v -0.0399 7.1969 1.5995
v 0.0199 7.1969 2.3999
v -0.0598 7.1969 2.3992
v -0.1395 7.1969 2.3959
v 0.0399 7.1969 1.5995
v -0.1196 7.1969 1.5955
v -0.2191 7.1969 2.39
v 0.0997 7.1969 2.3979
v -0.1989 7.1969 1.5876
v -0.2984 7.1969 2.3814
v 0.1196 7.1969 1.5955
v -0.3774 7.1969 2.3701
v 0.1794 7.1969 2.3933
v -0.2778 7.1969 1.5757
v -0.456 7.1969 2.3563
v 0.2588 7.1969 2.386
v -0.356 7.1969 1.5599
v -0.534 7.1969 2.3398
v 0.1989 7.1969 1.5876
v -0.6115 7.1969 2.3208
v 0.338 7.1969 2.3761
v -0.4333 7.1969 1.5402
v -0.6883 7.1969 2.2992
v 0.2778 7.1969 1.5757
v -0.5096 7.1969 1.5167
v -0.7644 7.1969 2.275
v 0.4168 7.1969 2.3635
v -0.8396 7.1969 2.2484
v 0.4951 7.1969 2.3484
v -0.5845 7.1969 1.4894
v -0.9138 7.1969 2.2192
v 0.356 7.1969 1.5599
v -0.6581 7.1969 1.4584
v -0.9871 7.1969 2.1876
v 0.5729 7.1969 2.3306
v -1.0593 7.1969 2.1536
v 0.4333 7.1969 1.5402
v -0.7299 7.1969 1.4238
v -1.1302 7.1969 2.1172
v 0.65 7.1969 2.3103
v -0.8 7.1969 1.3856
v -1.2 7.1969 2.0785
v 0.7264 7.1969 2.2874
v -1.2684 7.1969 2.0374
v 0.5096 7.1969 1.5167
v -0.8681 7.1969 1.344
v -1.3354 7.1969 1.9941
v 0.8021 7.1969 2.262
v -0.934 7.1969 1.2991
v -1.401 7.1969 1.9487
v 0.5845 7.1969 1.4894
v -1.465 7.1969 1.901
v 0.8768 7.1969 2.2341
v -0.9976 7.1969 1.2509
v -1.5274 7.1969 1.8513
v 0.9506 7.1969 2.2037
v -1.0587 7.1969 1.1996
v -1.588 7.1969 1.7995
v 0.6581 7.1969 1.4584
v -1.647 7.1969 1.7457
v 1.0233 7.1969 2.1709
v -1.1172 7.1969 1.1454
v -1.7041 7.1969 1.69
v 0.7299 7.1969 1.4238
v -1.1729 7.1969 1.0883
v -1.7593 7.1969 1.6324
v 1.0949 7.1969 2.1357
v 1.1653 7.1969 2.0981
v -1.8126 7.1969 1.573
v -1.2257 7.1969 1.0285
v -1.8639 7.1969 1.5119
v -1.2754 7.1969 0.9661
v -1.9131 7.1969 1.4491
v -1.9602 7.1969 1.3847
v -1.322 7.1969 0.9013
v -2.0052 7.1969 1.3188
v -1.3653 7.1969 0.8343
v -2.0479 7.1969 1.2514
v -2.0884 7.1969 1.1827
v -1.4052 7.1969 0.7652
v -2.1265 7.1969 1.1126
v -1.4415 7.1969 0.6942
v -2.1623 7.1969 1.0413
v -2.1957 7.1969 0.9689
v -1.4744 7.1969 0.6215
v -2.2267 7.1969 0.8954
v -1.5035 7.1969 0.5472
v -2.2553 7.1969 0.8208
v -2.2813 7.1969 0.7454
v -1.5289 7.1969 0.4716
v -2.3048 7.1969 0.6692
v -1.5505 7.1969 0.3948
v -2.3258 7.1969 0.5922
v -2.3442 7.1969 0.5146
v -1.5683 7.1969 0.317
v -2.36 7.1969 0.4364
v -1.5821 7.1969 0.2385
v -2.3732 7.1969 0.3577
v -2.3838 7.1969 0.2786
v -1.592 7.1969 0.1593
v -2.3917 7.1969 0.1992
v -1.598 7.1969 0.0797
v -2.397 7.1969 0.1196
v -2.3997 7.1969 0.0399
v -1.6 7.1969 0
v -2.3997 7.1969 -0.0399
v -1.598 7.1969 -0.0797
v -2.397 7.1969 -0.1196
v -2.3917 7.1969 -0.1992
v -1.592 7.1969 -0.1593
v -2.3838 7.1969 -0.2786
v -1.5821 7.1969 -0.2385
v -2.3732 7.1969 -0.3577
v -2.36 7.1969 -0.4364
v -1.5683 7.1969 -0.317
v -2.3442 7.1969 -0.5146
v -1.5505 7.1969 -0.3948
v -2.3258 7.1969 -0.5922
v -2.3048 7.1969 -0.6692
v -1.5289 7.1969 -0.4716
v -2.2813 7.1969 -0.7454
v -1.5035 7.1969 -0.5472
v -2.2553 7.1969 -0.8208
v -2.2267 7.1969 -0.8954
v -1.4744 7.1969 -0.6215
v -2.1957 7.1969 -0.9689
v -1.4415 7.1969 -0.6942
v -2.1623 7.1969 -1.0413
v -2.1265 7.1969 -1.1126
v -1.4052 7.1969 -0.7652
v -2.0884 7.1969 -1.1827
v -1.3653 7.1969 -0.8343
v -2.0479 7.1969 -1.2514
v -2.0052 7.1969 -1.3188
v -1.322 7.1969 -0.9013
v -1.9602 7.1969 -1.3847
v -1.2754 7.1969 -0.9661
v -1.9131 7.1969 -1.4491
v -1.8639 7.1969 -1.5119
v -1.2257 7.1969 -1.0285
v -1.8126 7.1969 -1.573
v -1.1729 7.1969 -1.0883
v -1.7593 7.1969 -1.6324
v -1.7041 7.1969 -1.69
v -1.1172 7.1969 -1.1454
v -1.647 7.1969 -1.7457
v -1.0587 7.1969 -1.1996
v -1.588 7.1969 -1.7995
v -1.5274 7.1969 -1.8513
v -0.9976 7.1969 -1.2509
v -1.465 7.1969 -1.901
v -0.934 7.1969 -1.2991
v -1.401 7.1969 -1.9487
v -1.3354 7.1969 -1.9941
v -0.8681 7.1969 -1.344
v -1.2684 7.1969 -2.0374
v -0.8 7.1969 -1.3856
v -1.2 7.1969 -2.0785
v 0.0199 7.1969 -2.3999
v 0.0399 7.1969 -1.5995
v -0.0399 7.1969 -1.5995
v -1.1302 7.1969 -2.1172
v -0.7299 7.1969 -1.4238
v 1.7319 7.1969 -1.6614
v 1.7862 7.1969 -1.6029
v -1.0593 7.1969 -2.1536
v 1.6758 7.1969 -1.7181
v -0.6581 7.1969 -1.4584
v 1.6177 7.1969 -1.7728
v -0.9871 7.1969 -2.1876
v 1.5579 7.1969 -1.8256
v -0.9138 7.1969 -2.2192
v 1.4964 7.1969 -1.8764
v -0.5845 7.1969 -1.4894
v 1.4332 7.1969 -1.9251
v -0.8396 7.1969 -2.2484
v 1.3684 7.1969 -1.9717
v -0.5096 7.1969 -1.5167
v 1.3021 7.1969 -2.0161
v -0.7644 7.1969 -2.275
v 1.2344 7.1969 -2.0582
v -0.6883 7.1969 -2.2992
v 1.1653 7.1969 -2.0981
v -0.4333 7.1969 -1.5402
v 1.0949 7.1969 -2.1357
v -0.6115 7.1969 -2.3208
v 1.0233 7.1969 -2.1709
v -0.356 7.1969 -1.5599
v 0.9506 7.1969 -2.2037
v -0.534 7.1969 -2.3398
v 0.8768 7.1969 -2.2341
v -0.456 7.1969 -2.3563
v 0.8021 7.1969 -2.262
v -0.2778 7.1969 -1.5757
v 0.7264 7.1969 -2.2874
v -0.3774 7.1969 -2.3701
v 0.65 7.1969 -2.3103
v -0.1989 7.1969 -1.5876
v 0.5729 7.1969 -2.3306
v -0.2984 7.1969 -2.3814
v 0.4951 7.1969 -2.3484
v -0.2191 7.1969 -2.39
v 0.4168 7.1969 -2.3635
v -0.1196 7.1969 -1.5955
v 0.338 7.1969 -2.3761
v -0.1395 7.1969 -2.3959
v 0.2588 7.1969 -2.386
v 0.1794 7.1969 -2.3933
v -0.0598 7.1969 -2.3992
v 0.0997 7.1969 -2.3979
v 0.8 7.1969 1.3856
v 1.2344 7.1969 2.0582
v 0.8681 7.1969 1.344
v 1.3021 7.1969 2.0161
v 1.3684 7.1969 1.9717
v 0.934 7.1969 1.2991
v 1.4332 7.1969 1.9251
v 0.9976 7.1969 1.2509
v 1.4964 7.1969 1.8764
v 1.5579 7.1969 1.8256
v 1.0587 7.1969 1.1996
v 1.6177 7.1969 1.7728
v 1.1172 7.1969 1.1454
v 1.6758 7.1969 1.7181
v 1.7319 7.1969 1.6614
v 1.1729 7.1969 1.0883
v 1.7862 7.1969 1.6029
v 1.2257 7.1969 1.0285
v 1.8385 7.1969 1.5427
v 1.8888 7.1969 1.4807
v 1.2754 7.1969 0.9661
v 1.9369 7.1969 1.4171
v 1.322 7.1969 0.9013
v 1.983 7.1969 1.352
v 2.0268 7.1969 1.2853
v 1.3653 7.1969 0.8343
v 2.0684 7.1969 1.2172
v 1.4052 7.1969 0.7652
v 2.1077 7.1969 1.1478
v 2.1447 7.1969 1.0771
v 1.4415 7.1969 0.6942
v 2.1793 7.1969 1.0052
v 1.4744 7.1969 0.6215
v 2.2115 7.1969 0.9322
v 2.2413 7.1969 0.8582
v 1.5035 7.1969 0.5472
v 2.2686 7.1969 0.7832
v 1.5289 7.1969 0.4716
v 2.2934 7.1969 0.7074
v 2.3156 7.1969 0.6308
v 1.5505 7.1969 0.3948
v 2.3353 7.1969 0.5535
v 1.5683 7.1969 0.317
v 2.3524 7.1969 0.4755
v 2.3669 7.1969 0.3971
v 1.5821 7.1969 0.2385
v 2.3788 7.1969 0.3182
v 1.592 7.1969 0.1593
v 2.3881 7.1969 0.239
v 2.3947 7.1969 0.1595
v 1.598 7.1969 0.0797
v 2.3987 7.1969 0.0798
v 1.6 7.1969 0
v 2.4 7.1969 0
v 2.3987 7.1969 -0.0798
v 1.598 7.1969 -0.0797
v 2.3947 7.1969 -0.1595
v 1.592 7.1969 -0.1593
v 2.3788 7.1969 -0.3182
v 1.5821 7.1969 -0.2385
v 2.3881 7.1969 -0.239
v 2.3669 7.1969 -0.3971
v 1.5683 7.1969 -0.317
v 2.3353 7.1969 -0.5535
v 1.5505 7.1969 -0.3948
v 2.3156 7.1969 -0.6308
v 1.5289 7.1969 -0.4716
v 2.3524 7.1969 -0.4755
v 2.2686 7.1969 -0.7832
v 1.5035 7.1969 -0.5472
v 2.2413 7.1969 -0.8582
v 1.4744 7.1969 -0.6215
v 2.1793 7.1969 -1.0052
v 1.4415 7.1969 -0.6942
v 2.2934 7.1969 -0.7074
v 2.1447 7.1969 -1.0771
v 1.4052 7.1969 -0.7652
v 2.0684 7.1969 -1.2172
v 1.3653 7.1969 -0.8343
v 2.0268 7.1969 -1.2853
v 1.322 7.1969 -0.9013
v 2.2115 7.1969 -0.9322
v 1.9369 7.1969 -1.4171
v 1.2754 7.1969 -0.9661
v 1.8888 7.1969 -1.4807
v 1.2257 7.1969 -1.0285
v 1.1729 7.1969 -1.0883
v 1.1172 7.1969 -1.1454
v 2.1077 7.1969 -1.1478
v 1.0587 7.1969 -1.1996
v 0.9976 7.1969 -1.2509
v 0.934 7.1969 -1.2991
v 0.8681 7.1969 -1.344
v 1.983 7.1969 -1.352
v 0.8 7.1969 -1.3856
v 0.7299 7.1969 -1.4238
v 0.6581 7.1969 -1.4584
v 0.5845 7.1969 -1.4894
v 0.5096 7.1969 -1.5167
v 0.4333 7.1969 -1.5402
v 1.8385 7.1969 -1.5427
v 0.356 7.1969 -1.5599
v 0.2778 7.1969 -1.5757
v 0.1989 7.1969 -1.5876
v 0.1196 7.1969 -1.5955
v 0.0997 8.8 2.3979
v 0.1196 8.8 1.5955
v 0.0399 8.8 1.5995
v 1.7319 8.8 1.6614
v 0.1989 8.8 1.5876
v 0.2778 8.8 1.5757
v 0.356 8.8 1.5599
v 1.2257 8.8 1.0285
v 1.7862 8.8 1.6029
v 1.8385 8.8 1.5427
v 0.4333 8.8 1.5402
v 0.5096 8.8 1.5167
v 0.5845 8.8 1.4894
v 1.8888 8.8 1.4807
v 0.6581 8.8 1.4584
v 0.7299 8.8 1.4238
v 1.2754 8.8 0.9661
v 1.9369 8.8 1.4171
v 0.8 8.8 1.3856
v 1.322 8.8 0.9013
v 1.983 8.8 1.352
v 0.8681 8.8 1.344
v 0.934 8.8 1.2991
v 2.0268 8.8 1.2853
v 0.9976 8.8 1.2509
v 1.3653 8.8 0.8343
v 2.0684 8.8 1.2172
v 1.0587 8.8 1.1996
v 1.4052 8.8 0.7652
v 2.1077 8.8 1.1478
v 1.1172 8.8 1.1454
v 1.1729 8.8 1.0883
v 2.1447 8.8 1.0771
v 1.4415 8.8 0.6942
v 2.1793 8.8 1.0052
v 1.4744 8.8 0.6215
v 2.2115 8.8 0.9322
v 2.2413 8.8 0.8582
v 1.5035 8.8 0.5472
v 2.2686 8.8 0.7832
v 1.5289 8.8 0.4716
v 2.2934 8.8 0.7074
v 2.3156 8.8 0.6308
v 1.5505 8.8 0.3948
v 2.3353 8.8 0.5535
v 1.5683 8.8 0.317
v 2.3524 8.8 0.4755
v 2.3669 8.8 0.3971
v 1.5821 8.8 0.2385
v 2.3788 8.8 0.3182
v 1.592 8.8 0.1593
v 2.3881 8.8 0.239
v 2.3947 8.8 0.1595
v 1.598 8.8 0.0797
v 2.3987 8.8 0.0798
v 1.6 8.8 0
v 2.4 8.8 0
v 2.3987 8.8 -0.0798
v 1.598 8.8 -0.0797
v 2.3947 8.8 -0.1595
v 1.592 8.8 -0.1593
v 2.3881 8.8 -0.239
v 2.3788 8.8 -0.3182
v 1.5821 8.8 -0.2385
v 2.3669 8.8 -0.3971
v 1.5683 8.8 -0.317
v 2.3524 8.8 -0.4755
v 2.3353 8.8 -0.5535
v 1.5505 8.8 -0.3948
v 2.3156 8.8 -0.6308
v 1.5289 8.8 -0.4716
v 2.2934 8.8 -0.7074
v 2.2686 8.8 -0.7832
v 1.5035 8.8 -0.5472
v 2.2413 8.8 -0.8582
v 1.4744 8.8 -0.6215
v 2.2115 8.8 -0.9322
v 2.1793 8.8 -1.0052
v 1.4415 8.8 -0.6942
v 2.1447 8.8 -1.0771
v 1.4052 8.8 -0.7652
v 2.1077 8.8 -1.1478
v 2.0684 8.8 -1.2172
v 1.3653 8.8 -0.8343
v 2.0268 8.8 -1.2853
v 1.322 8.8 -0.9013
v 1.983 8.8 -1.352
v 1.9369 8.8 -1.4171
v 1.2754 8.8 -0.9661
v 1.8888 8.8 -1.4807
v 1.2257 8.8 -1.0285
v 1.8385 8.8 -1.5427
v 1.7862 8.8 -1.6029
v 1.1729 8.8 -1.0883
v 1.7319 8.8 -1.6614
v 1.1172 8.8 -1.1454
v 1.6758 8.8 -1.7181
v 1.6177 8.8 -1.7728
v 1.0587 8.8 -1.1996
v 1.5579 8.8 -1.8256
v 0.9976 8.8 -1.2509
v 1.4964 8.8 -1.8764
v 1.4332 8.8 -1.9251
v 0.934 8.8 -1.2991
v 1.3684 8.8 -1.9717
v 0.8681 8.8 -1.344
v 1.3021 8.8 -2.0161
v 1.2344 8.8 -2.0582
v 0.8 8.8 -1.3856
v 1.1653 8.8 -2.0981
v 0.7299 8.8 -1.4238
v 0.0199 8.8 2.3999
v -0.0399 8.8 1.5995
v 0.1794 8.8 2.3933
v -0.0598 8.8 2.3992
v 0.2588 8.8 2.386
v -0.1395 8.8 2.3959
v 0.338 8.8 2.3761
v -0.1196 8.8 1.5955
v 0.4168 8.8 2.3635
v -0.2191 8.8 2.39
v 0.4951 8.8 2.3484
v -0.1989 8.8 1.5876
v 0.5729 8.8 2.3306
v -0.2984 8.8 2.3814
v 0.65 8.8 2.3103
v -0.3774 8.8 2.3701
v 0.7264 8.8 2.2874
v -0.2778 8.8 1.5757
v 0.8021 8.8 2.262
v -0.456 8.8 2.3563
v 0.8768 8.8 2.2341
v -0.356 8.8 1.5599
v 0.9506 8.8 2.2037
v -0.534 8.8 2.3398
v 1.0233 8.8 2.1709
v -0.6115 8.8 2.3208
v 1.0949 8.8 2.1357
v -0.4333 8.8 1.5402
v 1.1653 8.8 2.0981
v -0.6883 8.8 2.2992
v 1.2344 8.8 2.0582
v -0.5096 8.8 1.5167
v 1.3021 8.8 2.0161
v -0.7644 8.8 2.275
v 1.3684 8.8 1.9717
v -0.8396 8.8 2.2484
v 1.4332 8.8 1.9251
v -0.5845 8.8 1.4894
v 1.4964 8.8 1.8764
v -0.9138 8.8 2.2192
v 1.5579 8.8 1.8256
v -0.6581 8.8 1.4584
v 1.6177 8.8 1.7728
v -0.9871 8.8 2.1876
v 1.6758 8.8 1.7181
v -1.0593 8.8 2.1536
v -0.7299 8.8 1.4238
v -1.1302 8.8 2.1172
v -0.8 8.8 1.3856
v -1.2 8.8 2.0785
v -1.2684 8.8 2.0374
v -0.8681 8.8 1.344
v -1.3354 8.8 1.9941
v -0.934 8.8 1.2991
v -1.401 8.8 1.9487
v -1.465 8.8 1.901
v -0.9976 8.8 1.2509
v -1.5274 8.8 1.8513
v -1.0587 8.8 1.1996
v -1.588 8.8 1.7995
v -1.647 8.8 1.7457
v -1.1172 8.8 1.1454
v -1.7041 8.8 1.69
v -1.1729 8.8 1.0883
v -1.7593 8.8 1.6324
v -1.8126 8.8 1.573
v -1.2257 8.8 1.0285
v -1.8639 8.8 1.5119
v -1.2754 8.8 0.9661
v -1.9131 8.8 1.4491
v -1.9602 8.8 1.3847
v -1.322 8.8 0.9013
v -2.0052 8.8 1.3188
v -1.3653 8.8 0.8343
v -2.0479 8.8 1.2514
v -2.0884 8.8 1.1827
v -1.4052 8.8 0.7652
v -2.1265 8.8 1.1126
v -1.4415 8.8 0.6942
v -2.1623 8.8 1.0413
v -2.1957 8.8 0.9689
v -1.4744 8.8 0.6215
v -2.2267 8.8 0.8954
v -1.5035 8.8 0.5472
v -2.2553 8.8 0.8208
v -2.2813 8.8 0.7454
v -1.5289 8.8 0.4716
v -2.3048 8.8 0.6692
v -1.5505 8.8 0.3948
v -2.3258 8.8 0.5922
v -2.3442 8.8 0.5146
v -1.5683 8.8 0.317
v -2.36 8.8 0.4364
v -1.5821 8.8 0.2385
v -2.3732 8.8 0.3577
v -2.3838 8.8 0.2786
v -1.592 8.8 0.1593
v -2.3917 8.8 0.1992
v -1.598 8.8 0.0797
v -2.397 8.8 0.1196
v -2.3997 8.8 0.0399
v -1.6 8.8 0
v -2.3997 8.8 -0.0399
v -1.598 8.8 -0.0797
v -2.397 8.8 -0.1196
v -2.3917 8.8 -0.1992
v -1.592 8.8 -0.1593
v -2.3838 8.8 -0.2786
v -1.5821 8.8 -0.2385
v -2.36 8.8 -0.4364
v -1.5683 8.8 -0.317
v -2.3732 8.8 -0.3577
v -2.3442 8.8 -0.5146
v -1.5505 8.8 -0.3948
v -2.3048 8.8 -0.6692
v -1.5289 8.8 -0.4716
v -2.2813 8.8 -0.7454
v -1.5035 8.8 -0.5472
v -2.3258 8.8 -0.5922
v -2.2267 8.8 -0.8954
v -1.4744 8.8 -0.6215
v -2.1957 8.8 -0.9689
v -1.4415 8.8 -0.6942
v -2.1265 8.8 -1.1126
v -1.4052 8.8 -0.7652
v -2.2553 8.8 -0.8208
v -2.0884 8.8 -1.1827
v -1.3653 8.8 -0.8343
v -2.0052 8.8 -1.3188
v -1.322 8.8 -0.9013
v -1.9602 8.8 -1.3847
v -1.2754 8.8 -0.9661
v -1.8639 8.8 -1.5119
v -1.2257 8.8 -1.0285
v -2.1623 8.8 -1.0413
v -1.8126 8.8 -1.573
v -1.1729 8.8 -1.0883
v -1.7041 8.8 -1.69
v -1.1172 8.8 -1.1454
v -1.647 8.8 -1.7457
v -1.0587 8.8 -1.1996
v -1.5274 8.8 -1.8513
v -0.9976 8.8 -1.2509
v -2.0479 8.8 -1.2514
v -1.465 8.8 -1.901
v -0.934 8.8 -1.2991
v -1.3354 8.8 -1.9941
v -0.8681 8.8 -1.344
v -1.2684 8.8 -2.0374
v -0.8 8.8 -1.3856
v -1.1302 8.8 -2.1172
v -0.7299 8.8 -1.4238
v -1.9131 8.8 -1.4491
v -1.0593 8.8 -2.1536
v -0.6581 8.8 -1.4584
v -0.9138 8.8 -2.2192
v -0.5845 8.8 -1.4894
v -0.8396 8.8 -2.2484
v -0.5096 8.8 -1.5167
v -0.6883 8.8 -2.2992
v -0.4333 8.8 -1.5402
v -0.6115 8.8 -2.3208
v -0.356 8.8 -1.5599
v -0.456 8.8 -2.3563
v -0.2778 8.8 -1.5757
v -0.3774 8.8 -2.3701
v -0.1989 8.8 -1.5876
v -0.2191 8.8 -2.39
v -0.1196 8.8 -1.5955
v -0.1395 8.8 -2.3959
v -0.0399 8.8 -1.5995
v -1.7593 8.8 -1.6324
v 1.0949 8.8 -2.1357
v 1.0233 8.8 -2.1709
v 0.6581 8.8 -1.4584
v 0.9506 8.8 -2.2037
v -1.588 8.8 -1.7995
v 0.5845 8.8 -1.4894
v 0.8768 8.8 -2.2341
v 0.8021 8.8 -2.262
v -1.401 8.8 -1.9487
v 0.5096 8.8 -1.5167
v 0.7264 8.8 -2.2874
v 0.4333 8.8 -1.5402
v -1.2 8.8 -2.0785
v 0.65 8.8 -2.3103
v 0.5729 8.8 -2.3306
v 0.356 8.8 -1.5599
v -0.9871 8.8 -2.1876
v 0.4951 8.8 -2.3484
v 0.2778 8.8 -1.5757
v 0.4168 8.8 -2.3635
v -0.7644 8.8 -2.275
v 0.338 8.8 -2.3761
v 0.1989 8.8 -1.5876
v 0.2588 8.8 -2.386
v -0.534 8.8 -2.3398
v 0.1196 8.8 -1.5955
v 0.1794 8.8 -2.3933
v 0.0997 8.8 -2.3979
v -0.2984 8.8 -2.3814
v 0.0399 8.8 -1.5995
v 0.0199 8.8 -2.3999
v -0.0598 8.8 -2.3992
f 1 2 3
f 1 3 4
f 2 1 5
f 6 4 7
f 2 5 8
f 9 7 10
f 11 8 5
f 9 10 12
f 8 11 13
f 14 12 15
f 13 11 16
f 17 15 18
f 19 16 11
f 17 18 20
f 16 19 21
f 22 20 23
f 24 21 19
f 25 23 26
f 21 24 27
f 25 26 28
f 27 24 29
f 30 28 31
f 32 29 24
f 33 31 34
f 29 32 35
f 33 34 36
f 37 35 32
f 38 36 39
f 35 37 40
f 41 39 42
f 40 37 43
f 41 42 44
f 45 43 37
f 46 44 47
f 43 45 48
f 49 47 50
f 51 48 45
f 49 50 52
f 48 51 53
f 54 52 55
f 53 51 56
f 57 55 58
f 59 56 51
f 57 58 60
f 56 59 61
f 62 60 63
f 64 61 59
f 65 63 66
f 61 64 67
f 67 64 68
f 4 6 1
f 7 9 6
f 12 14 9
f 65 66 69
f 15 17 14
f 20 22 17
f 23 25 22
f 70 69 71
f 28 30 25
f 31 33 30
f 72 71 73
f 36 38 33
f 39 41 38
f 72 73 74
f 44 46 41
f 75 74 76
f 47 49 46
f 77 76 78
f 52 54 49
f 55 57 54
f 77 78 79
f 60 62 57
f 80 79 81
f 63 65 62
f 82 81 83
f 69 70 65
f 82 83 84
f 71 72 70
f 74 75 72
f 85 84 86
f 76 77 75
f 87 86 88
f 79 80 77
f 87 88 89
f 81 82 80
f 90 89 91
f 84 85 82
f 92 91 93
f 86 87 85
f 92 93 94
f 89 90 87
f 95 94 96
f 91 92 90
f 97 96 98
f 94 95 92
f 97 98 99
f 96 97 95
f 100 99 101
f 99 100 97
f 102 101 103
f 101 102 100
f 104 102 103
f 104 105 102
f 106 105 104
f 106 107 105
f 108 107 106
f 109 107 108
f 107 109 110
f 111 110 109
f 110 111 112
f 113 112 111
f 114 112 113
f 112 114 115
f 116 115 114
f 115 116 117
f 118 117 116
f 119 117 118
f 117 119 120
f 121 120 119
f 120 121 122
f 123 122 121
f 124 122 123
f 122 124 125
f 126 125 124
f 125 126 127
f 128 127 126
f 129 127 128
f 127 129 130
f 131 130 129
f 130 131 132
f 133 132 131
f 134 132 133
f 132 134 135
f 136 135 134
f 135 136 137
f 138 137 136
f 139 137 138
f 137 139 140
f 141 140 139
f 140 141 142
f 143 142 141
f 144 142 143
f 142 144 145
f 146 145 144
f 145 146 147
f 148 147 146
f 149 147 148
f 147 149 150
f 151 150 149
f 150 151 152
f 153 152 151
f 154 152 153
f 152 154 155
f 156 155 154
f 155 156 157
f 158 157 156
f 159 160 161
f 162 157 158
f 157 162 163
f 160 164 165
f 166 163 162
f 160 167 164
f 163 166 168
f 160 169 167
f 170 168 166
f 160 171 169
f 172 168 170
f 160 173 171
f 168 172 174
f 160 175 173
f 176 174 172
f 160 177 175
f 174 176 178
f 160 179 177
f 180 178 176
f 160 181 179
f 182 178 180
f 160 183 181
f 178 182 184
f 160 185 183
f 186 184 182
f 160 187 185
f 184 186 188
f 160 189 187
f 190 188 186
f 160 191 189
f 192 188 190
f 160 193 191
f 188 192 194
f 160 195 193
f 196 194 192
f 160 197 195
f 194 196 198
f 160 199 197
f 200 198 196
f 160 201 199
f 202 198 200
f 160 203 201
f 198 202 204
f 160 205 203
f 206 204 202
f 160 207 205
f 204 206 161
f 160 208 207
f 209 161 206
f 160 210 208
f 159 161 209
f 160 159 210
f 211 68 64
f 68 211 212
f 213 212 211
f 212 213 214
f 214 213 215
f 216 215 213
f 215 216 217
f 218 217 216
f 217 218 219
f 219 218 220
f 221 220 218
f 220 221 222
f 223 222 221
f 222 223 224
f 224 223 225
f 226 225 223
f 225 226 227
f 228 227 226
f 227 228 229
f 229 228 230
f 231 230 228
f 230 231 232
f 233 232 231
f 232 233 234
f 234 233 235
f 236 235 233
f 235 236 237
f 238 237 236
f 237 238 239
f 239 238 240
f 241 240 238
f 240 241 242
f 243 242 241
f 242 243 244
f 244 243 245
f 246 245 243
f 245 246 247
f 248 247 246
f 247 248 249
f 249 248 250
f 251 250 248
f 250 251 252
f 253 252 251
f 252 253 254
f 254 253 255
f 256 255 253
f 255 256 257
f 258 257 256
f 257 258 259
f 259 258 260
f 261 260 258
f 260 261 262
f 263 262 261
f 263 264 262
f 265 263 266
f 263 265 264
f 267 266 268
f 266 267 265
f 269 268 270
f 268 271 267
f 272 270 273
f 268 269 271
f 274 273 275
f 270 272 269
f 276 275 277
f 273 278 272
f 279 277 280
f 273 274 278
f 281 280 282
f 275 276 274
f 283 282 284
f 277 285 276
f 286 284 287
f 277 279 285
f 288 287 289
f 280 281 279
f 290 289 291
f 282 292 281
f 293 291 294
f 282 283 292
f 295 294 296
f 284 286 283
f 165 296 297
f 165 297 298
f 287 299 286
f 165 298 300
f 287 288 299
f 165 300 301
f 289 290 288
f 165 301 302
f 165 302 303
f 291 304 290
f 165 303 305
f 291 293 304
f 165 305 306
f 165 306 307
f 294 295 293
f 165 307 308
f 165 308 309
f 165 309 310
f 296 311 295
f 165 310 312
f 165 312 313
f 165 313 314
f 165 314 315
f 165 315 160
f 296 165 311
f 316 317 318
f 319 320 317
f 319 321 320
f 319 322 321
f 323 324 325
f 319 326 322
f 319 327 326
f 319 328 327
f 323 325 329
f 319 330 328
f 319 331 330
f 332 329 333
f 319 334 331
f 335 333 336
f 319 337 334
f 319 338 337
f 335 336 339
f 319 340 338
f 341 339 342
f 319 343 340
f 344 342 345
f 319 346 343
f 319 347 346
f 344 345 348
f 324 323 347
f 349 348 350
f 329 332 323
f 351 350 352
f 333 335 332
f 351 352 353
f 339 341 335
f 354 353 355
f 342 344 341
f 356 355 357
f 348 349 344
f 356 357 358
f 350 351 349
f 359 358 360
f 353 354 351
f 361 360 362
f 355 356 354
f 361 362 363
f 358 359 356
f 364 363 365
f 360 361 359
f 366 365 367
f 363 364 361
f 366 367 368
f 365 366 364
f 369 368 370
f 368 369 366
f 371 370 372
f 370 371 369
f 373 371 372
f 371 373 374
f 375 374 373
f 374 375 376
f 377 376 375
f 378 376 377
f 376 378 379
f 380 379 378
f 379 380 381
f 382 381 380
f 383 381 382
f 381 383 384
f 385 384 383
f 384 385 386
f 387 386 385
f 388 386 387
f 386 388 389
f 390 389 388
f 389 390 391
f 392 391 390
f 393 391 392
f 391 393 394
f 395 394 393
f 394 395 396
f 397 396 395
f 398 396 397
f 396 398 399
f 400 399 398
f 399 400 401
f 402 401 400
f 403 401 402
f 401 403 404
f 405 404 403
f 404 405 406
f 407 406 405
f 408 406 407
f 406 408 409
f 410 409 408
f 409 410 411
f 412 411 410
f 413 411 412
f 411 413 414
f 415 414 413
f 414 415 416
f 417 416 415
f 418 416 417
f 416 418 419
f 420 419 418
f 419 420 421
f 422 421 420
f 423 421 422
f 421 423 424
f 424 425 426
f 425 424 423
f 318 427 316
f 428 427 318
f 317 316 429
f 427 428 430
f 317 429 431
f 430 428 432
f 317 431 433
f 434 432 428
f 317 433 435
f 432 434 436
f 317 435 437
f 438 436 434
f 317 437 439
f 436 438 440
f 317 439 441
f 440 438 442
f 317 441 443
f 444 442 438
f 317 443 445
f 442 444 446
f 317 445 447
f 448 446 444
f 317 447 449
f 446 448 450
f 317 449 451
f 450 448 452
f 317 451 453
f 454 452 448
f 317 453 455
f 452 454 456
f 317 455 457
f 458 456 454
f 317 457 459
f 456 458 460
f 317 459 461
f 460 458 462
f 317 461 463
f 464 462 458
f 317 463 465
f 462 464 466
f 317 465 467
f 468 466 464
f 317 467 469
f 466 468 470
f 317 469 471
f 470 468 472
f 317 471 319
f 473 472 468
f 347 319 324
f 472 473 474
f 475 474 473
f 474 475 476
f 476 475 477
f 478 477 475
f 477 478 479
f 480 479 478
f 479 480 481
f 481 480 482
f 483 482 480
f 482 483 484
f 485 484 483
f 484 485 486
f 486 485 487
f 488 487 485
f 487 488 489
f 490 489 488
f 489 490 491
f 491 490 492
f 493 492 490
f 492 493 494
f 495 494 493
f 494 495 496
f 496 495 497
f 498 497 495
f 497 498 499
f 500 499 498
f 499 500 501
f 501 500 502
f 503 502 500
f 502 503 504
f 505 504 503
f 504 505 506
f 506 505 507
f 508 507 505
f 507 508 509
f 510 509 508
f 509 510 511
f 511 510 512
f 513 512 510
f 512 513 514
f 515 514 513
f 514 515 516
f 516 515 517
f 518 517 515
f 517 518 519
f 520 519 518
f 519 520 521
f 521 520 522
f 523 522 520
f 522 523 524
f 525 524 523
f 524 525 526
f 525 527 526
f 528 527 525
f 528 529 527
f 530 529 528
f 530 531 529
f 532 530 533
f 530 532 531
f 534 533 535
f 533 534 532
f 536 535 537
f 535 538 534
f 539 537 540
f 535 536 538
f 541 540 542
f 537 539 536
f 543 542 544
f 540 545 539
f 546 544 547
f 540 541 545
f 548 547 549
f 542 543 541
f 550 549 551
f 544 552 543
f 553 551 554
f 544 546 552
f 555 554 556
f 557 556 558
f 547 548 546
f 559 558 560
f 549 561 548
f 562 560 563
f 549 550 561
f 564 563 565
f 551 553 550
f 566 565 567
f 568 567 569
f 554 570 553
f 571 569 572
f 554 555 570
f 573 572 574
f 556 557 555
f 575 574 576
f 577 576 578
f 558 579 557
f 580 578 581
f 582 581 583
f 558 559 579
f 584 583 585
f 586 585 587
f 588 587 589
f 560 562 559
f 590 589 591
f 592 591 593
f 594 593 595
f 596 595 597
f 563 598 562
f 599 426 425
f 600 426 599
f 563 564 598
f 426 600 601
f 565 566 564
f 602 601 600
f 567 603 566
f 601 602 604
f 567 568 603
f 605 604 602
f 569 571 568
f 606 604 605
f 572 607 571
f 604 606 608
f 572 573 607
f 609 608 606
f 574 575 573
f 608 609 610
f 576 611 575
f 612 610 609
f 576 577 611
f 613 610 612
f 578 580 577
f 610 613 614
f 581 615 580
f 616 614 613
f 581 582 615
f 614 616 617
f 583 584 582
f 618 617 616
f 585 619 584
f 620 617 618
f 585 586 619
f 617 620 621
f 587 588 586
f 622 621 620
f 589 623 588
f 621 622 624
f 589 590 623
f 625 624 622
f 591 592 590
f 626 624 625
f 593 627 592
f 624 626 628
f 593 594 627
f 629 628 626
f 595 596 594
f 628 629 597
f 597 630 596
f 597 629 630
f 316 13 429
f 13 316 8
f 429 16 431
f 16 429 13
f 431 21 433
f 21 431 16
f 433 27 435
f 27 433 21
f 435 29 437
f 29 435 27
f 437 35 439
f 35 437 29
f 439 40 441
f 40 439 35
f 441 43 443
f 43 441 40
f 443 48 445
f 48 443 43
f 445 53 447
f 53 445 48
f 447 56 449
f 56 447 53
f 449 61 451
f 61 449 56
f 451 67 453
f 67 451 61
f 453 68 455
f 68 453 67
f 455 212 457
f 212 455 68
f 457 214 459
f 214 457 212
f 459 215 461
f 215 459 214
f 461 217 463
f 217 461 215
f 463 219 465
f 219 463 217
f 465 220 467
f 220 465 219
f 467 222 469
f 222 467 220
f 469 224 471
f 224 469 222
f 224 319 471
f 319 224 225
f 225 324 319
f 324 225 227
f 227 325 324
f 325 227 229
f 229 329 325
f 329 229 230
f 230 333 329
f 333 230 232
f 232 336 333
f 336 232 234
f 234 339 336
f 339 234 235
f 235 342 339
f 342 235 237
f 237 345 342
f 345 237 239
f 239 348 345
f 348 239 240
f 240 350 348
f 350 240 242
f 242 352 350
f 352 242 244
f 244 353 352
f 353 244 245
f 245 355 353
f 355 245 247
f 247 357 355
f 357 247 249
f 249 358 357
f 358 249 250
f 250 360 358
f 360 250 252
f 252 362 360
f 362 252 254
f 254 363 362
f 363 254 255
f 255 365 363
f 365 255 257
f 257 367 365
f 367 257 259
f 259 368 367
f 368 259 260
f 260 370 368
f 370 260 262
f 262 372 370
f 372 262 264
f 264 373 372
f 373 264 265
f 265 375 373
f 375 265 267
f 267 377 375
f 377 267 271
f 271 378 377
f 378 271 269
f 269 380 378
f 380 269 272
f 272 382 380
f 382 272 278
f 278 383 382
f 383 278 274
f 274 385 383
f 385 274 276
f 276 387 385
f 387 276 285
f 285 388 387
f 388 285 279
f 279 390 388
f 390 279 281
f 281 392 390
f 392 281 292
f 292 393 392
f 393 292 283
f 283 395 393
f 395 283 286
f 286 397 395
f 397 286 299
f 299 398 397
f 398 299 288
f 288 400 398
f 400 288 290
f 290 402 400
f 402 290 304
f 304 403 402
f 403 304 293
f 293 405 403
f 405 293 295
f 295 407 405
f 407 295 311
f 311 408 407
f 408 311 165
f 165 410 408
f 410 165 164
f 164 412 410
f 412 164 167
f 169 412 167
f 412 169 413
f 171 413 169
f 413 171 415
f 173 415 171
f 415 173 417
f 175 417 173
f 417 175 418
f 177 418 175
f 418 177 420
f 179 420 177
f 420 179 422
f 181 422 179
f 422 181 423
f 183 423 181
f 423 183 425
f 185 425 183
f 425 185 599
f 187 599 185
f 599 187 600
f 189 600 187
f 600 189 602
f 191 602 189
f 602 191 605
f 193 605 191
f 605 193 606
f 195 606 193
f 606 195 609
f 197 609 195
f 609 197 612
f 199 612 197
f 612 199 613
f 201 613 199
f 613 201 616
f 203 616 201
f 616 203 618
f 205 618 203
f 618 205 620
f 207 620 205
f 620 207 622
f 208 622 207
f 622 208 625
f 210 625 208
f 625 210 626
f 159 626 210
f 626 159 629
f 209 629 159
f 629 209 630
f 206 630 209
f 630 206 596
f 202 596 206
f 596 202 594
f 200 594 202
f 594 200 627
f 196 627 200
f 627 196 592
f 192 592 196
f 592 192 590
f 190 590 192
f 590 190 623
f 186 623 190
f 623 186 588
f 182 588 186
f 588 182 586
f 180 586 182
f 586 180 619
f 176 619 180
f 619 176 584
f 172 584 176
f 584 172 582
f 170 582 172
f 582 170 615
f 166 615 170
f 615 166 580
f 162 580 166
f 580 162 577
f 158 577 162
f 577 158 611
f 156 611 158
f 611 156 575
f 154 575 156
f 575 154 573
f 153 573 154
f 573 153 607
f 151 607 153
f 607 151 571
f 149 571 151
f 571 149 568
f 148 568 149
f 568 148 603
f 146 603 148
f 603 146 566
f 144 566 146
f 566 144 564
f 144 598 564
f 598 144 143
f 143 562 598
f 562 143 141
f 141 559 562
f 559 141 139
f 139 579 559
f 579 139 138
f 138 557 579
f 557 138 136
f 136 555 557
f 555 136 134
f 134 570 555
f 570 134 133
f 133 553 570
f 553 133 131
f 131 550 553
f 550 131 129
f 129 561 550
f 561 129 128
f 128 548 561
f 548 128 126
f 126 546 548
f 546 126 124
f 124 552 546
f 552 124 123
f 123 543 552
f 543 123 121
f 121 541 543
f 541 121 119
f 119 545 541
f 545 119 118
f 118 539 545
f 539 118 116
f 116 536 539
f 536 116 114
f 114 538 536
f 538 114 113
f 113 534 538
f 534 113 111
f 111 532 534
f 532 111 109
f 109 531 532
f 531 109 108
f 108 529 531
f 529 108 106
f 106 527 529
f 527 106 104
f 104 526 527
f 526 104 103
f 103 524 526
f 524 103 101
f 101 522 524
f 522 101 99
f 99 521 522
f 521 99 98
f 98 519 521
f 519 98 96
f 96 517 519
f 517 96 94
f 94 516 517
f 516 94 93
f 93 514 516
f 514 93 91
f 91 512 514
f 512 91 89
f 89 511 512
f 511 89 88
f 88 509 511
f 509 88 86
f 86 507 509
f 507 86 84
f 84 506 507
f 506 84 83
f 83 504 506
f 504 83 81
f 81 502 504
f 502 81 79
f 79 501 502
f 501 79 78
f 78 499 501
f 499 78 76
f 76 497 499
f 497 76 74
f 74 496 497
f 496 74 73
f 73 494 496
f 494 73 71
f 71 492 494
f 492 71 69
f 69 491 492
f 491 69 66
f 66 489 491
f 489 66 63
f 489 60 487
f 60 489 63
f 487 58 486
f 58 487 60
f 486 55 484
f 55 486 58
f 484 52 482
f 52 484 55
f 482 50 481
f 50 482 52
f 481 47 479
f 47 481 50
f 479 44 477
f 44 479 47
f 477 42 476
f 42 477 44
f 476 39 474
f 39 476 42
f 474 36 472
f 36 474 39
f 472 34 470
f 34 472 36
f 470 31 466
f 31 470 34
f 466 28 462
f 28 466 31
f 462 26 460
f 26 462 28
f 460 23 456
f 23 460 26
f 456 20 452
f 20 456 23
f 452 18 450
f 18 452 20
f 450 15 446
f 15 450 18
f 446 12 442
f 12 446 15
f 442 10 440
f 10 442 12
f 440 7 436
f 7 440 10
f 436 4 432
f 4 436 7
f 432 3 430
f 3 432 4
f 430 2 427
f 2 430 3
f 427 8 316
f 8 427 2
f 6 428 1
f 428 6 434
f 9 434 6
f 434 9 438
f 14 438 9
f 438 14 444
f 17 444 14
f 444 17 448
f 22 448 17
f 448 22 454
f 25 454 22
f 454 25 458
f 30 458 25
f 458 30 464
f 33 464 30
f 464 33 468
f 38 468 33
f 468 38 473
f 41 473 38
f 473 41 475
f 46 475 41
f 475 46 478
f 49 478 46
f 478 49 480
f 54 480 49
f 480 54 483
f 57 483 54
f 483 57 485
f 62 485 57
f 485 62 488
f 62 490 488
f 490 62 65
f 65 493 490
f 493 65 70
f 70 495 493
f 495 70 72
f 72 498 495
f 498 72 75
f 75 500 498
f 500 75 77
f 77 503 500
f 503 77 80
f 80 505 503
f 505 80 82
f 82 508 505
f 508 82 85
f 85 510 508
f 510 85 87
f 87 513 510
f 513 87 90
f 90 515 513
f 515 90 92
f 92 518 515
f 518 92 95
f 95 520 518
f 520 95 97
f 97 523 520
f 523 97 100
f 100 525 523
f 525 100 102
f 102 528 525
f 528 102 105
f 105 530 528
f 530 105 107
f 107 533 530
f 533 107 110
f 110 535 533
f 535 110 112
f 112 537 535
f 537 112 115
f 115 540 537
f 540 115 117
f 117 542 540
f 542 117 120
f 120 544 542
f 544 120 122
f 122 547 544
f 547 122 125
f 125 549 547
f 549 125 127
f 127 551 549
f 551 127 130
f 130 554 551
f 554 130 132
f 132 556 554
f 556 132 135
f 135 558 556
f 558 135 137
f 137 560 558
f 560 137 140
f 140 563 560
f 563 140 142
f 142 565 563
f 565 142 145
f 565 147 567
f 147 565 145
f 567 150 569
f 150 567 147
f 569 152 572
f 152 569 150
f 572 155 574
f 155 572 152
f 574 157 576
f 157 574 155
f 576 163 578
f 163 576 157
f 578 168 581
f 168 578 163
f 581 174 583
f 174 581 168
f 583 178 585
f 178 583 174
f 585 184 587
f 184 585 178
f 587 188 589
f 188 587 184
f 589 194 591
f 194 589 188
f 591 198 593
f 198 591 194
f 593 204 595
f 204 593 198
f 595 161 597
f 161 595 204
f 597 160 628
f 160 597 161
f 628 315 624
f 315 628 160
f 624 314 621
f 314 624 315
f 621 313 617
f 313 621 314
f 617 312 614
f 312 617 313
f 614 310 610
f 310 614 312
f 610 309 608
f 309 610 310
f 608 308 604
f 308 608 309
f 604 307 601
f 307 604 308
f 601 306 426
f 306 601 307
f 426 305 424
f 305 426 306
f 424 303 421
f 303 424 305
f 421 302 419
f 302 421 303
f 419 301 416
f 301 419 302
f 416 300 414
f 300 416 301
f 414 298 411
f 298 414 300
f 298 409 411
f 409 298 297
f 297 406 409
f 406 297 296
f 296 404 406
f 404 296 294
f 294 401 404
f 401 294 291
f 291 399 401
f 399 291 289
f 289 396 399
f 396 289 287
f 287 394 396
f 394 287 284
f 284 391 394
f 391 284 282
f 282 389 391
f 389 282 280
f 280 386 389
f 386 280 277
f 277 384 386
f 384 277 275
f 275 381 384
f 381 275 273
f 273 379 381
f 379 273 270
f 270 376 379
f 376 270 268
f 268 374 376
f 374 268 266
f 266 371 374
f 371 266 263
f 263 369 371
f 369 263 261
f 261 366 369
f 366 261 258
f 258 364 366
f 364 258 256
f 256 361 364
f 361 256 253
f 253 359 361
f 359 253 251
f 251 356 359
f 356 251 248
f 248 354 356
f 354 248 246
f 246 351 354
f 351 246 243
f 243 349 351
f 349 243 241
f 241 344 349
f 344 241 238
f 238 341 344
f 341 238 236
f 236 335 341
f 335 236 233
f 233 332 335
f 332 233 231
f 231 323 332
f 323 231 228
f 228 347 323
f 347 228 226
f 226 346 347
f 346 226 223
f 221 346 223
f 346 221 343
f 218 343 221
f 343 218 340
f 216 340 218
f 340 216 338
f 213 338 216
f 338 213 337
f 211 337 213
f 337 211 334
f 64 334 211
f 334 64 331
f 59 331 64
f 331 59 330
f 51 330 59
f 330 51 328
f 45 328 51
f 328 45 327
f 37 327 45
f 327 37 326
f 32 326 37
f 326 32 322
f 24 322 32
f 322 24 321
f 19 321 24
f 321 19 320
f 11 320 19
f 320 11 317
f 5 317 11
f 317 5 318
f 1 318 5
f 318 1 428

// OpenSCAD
use <../lib.scad>
use <../p/4-4con2.scad>
use <../p/4-4con8.scad>
use <../p/4-4cyli.scad>
use <../p/4-4disc.scad>
use <../p/4-4edge.scad>
use <../p/4-4ring3.scad>
use <../p/4-4ring4.scad>
use <../p/stud2.scad>
$fa=1; $fs=0.2;
function ldraw_lib__4349(realsolid=false) = [
// 0 Minifig Loudhailer
// 0 Name: 4349.dat
// 0 Author: James Jessiman
// 0 !LDRAW_ORG Part UPDATE 2010-01
// 0 !LICENSE Licensed under CC BY 2.0 and CC BY 4.0 : see CAreadme.txt
// 
// 0 BFC CERTIFY CCW
  [0,"BFC","CERTIFY"],
  [0,"BFC","CCW"],
// 
// 0 !CATEGORY Minifig Accessory
// 0 !KEYWORDS Blaster, bullhorn, cone, megaphone, space gun, town
// 
// 0 !HISTORY 1998-06-20 [PTadmin] Official Update 1998-06
// 0 !HISTORY 2001-10-01 [pneaster] used existing primitives to enhance appearance
// 0 !HISTORY 2001-11-30 [PTadmin] Official Update 2001-02
// 0 !HISTORY 2007-07-04 [PTadmin] Header formatted for Contributor Agreement
// 0 !HISTORY 2008-07-01 [PTadmin] Official Update 2008-01
// 0 !HISTORY 2008-07-07 [jriley] BFC compliancy (2003-06-08)
// 0 !HISTORY 2008-07-08 [mikeheide] added edgelines (2007-11-02)
// 0 !HISTORY 2008-07-09 [mikeheide] Corrected title (2008-03-01)
// 0 !HISTORY 2010-04-05 [PTadmin] Official Update 2010-01
// 
// 
// 1 16 0 0 18 0 0 -1 1 0 0 0 -1 0 stud2.dat
  [1,16,0,0,18,0,0,-1,1,0,0,0,-1,0, ldraw_lib__stud2(realsolid)],
// 1 16 0 20 0 4 0 0 0 1 0 0 0 4 4-4edge.dat
  [1,16,0,20,0,4,0,0,0,1,0,0,0,4, ldraw_lib__4_4edge(realsolid)],
// 1 16 0 0 18 7.104 0 0 0 0 7.104 0 1 0 4-4edge.dat
  [1,16,0,0,18,7.104,0,0,0,0,7.104,0,1,0, ldraw_lib__4_4edge(realsolid)],
// 1 16 0 0 -4 6.666 0 0 0 0 6.666 0 1 0 4-4edge.dat
  [1,16,0,0,-4,6.666,0,0,0,0,6.666,0,1,0, ldraw_lib__4_4edge(realsolid)],
// 1 16 0 0 -4 4 0 0 0 0 4 0 1 0 4-4edge.dat
  [1,16,0,0,-4,4,0,0,0,0,4,0,1,0, ldraw_lib__4_4edge(realsolid)],
// 1 16 0 0 -22 6 0 0 0 0 6 0 1 0 4-4edge.dat
  [1,16,0,0,-22,6,0,0,0,0,6,0,1,0, ldraw_lib__4_4edge(realsolid)],
// 1 16 0 0 -22 10 0 0 0 0 10 0 1 0 4-4edge.dat
  [1,16,0,0,-22,10,0,0,0,0,10,0,1,0, ldraw_lib__4_4edge(realsolid)],
// 1 16 0 20 0 4 0 0 0 -1 0 0 0 4 4-4disc.dat
  [1,16,0,20,0,4,0,0,0,-1,0,0,0,4, ldraw_lib__4_4disc(realsolid)],
// 1 16 0 0 18 7.104 0 0 0 0 7.104 0 -1 0 4-4disc.dat
  [1,16,0,0,18,7.104,0,0,0,0,7.104,0,-1,0, ldraw_lib__4_4disc(realsolid)],
// 1 16 0 0 -4 1.4208 0 0 0 0 1.4208 0 1 0 4-4ring4.dat
  [1,16,0,0,-4,1.4208,0,0,0,0,1.4208,0,1,0, ldraw_lib__4_4ring4(realsolid)],
// 1 16 0 5.9533 0 4 0 0 0 14.0467 0 0 0 4 4-4cyli.dat
  [1,16,0,5.9533,0,4,0,0,0,14.0467,0,0,0,4, ldraw_lib__4_4cyli(realsolid)],
// 1 16 0 0 -4 7.104 0 0 0 0 7.104 0 1 0 4-4edge.dat
  [1,16,0,0,-4,7.104,0,0,0,0,7.104,0,1,0, ldraw_lib__4_4edge(realsolid)],
// 1 16 0 0 -3.25 0.888 0 0 0 0 0.888 0 -0.75 0 4-4con8.dat
  [1,16,0,0,-3.25,0.888,0,0,0,0,0.888,0,-0.75,0, ldraw_lib__4_4con8(realsolid)],
// 1 16 0 0 -3.25 8 0 0 0 0 8 0 1.25 0 4-4cyli.dat
  [1,16,0,0,-3.25,8,0,0,0,0,8,0,1.25,0, ldraw_lib__4_4cyli(realsolid)],
// 1 16 0 0 -2 0.888 0 0 0 0 0.888 0 0.75 0 4-4con8.dat
  [1,16,0,0,-2,0.888,0,0,0,0,0.888,0,0.75,0, ldraw_lib__4_4con8(realsolid)],
// 1 16 0 0 -1.25 7.104 0 0 0 0 7.104 0 1 0 4-4edge.dat
  [1,16,0,0,-1.25,7.104,0,0,0,0,7.104,0,1,0, ldraw_lib__4_4edge(realsolid)],
// 1 16 0 0 -0.5 0.888 0 0 0 0 0.888 0 -0.75 0 4-4con8.dat
  [1,16,0,0,-0.5,0.888,0,0,0,0,0.888,0,-0.75,0, ldraw_lib__4_4con8(realsolid)],
// 1 16 0 0 -0.5 8 0 0 0 0 8 0 1.25 0 4-4cyli.dat
  [1,16,0,0,-0.5,8,0,0,0,0,8,0,1.25,0, ldraw_lib__4_4cyli(realsolid)],
// 1 16 0 0 0.75 0.888 0 0 0 0 0.888 0 0.75 0 4-4con8.dat
  [1,16,0,0,0.75,0.888,0,0,0,0,0.888,0,0.75,0, ldraw_lib__4_4con8(realsolid)],
// 1 16 0 0 1.5 7.104 0 0 0 0 7.104 0 1 0 4-4edge.dat
  [1,16,0,0,1.5,7.104,0,0,0,0,7.104,0,1,0, ldraw_lib__4_4edge(realsolid)],
// 1 16 0 0 2.25 0.888 0 0 0 0 0.888 0 -0.75 0 4-4con8.dat
  [1,16,0,0,2.25,0.888,0,0,0,0,0.888,0,-0.75,0, ldraw_lib__4_4con8(realsolid)],
// 1 16 0 0 2.25 8 0 0 0 0 8 0 1.25 0 4-4cyli.dat
  [1,16,0,0,2.25,8,0,0,0,0,8,0,1.25,0, ldraw_lib__4_4cyli(realsolid)],
// 1 16 0 0 3.5 0.888 0 0 0 0 0.888 0 0.75 0 4-4con8.dat
  [1,16,0,0,3.5,0.888,0,0,0,0,0.888,0,0.75,0, ldraw_lib__4_4con8(realsolid)],
// 1 16 0 0 4.25 7.104 0 0 0 0 7.104 0 1 0 4-4edge.dat
  [1,16,0,0,4.25,7.104,0,0,0,0,7.104,0,1,0, ldraw_lib__4_4edge(realsolid)],
// 1 16 0 0 5 0.888 0 0 0 0 0.888 0 -0.75 0 4-4con8.dat
  [1,16,0,0,5,0.888,0,0,0,0,0.888,0,-0.75,0, ldraw_lib__4_4con8(realsolid)],
// 1 16 0 0 5 8 0 0 0 0 8 0 1.25 0 4-4cyli.dat
  [1,16,0,0,5,8,0,0,0,0,8,0,1.25,0, ldraw_lib__4_4cyli(realsolid)],
// 1 16 0 0 6.25 0.888 0 0 0 0 0.888 0 0.75 0 4-4con8.dat
  [1,16,0,0,6.25,0.888,0,0,0,0,0.888,0,0.75,0, ldraw_lib__4_4con8(realsolid)],
// 1 16 0 0 7 7.104 0 0 0 0 7.104 0 1 0 4-4edge.dat
  [1,16,0,0,7,7.104,0,0,0,0,7.104,0,1,0, ldraw_lib__4_4edge(realsolid)],
// 1 16 0 0 7.75 0.888 0 0 0 0 0.888 0 -0.75 0 4-4con8.dat
  [1,16,0,0,7.75,0.888,0,0,0,0,0.888,0,-0.75,0, ldraw_lib__4_4con8(realsolid)],
// 1 16 0 0 7.75 8 0 0 0 0 8 0 1.25 0 4-4cyli.dat
  [1,16,0,0,7.75,8,0,0,0,0,8,0,1.25,0, ldraw_lib__4_4cyli(realsolid)],
// 1 16 0 0 9 0.888 0 0 0 0 0.888 0 0.75 0 4-4con8.dat
  [1,16,0,0,9,0.888,0,0,0,0,0.888,0,0.75,0, ldraw_lib__4_4con8(realsolid)],
// 1 16 0 0 9.75 7.104 0 0 0 0 7.104 0 1 0 4-4edge.dat
  [1,16,0,0,9.75,7.104,0,0,0,0,7.104,0,1,0, ldraw_lib__4_4edge(realsolid)],
// 1 16 0 0 10.5 0.888 0 0 0 0 0.888 0 -0.75 0 4-4con8.dat
  [1,16,0,0,10.5,0.888,0,0,0,0,0.888,0,-0.75,0, ldraw_lib__4_4con8(realsolid)],
// 1 16 0 0 10.5 8 0 0 0 0 8 0 1.25 0 4-4cyli.dat
  [1,16,0,0,10.5,8,0,0,0,0,8,0,1.25,0, ldraw_lib__4_4cyli(realsolid)],
// 1 16 0 0 11.75 0.888 0 0 0 0 0.888 0 0.75 0 4-4con8.dat
  [1,16,0,0,11.75,0.888,0,0,0,0,0.888,0,0.75,0, ldraw_lib__4_4con8(realsolid)],
// 1 16 0 0 12.5 7.104 0 0 0 0 7.104 0 1 0 4-4edge.dat
  [1,16,0,0,12.5,7.104,0,0,0,0,7.104,0,1,0, ldraw_lib__4_4edge(realsolid)],
// 1 16 0 0 13.25 0.888 0 0 0 0 0.888 0 -0.75 0 4-4con8.dat
  [1,16,0,0,13.25,0.888,0,0,0,0,0.888,0,-0.75,0, ldraw_lib__4_4con8(realsolid)],
// 1 16 0 0 13.25 8 0 0 0 0 8 0 1.25 0 4-4cyli.dat
  [1,16,0,0,13.25,8,0,0,0,0,8,0,1.25,0, ldraw_lib__4_4cyli(realsolid)],
// 1 16 0 0 14.5 0.888 0 0 0 0 0.888 0 0.75 0 4-4con8.dat
  [1,16,0,0,14.5,0.888,0,0,0,0,0.888,0,0.75,0, ldraw_lib__4_4con8(realsolid)],
// 1 16 0 0 15.25 7.104 0 0 0 0 7.104 0 1 0 4-4edge.dat
  [1,16,0,0,15.25,7.104,0,0,0,0,7.104,0,1,0, ldraw_lib__4_4edge(realsolid)],
// 1 16 0 0 16 0.888 0 0 0 0 0.888 0 -0.75 0 4-4con8.dat
  [1,16,0,0,16,0.888,0,0,0,0,0.888,0,-0.75,0, ldraw_lib__4_4con8(realsolid)],
// 1 16 0 0 16 8 0 0 0 0 8 0 1.25 0 4-4cyli.dat
  [1,16,0,0,16,8,0,0,0,0,8,0,1.25,0, ldraw_lib__4_4cyli(realsolid)],
// 1 16 0 0 16 8 0 0 0 0 8 0 1.25 0 4-4edge.dat
  [1,16,0,0,16,8,0,0,0,0,8,0,1.25,0, ldraw_lib__4_4edge(realsolid)],
// 1 16 0 0 17.25 8 0 0 0 0 8 0 1 0 4-4edge.dat
  [1,16,0,0,17.25,8,0,0,0,0,8,0,1,0, ldraw_lib__4_4edge(realsolid)],
// 1 16 0 0 13.25 8 0 0 0 0 8 0 1.25 0 4-4edge.dat
  [1,16,0,0,13.25,8,0,0,0,0,8,0,1.25,0, ldraw_lib__4_4edge(realsolid)],
// 1 16 0 0 14.5 8 0 0 0 0 8 0 1 0 4-4edge.dat
  [1,16,0,0,14.5,8,0,0,0,0,8,0,1,0, ldraw_lib__4_4edge(realsolid)],
// 1 16 0 0 10.5 8 0 0 0 0 8 0 1.25 0 4-4edge.dat
  [1,16,0,0,10.5,8,0,0,0,0,8,0,1.25,0, ldraw_lib__4_4edge(realsolid)],
// 1 16 0 0 11.75 8 0 0 0 0 8 0 1 0 4-4edge.dat
  [1,16,0,0,11.75,8,0,0,0,0,8,0,1,0, ldraw_lib__4_4edge(realsolid)],
// 1 16 0 0 7.75 8 0 0 0 0 8 0 1.25 0 4-4edge.dat
  [1,16,0,0,7.75,8,0,0,0,0,8,0,1.25,0, ldraw_lib__4_4edge(realsolid)],
// 1 16 0 0 9 8 0 0 0 0 8 0 1 0 4-4edge.dat
  [1,16,0,0,9,8,0,0,0,0,8,0,1,0, ldraw_lib__4_4edge(realsolid)],
// 1 16 0 0 5 8 0 0 0 0 8 0 1.25 0 4-4edge.dat
  [1,16,0,0,5,8,0,0,0,0,8,0,1.25,0, ldraw_lib__4_4edge(realsolid)],
// 1 16 0 0 6.25 8 0 0 0 0 8 0 1 0 4-4edge.dat
  [1,16,0,0,6.25,8,0,0,0,0,8,0,1,0, ldraw_lib__4_4edge(realsolid)],
// 1 16 0 0 2.25 8 0 0 0 0 8 0 1.25 0 4-4edge.dat
  [1,16,0,0,2.25,8,0,0,0,0,8,0,1.25,0, ldraw_lib__4_4edge(realsolid)],
// 1 16 0 0 3.5 8 0 0 0 0 8 0 1 0 4-4edge.dat
  [1,16,0,0,3.5,8,0,0,0,0,8,0,1,0, ldraw_lib__4_4edge(realsolid)],
// 1 16 0 0 -0.5 8 0 0 0 0 8 0 1.25 0 4-4edge.dat
  [1,16,0,0,-0.5,8,0,0,0,0,8,0,1.25,0, ldraw_lib__4_4edge(realsolid)],
// 1 16 0 0 0.75 8 0 0 0 0 8 0 1 0 4-4edge.dat
  [1,16,0,0,0.75,8,0,0,0,0,8,0,1,0, ldraw_lib__4_4edge(realsolid)],
// 1 16 0 0 -3.25 8 0 0 0 0 8 0 1.25 0 4-4edge.dat
  [1,16,0,0,-3.25,8,0,0,0,0,8,0,1.25,0, ldraw_lib__4_4edge(realsolid)],
// 1 16 0 0 -2 8 0 0 0 0 8 0 1 0 4-4edge.dat
  [1,16,0,0,-2,8,0,0,0,0,8,0,1,0, ldraw_lib__4_4edge(realsolid)],
// 1 16 0 0 17.25 0.888 0 0 0 0 0.888 0 0.75 0 4-4con8.dat
  [1,16,0,0,17.25,0.888,0,0,0,0,0.888,0,0.75,0, ldraw_lib__4_4con8(realsolid)],
// 0 BFC INVERTNEXT
  [0,"BFC","INVERTNEXT"],
// 1 16 0 0 -4 4 0 0 0 0 4 0 18 0 4-4cyli.dat
  [1,16,0,0,-4,4,0,0,0,0,4,0,18,0, ldraw_lib__4_4cyli(realsolid)],
// 1 16 0 0 14 4 0 0 0 0 4 0 1 0 4-4disc.dat
  [1,16,0,0,14,4,0,0,0,0,4,0,1,0, ldraw_lib__4_4disc(realsolid)],
// 1 16 0 0 14 4 0 0 0 0 4 0 1 0 4-4edge.dat
  [1,16,0,0,14,4,0,0,0,0,4,0,1,0, ldraw_lib__4_4edge(realsolid)],
// 1 16 0 0 -22 3.333 0 0 0 0 3.333 0 18 0 4-4con2.dat
  [1,16,0,0,-22,3.333,0,0,0,0,3.333,0,18,0, ldraw_lib__4_4con2(realsolid)],
// 0 BFC INVERTNEXT
  [0,"BFC","INVERTNEXT"],
// 1 16 0 0 -22 2 0 0 0 0 2 0 18 0 4-4con2.dat
  [1,16,0,0,-22,2,0,0,0,0,2,0,18,0, ldraw_lib__4_4con2(realsolid)],
// 1 16 0 0 -22 2.5 0 0 0 0 2.5 0 1 0 4-4ring3.dat
  [1,16,0,0,-22,2.5,0,0,0,0,2.5,0,1,0, ldraw_lib__4_4ring3(realsolid)],
// 1 16 0 0 -22 1.5 0 0 0 0 1.5 0 1 0 4-4ring4.dat
  [1,16,0,0,-22,1.5,0,0,0,0,1.5,0,1,0, ldraw_lib__4_4ring4(realsolid)],
// 0
// 2 24 3.70215 5.90586 1.5 3.79525 6.49892 1.03116
  [2,24,3.70215,5.90586,1.5,3.79525,6.49892,1.03116],
// 2 24 3.70215 5.90586 1.5 3.696 5.9533 1.531
  [2,24,3.70215,5.90586,1.5,3.696,5.9533,1.531],
// 2 24 4 6.76422 0 3.85108 6.86373 0.75
  [2,24,4,6.76422,0,3.85108,6.86373,0.75],
// 2 24 3.79525 6.49892 1.03116 3.85108 6.85442 0.75
  [2,24,3.79525,6.49892,1.03116,3.85108,6.85442,0.75],
// 2 24 3.062 7.391 2.47835 2.828 7.43754 2.828
  [2,24,3.062,7.391,2.47835,2.828,7.43754,2.828],
// 2 24 3.696 5.9533 1.531 3.21482 7.27982 2.25
  [2,24,3.696,5.9533,1.531,3.21482,7.27982,2.25],
// 2 24 3.21482 7.28888 2.25 3.062 7.391 2.47835
  [2,24,3.21482,7.28888,2.25,3.062,7.391,2.47835],
// 2 24 1.531 7.45549 3.696 1.82387 7.62949 3.5
  [2,24,1.531,7.45549,3.696,1.82387,7.62949,3.5],
// 2 24 1.82387 7.63725 3.5 2.828 7.43754 2.828
  [2,24,1.82387,7.63725,3.5,2.828,7.43754,2.828],
// 2 24 0 7.4 4 1.05396 7.43808 3.79072
  [2,24,0,7.4,4,1.05396,7.43808,3.79072],
// 2 24 1.05396 7.43808 3.79072 1.531 7.45549 3.696
  [2,24,1.05396,7.43808,3.79072,1.531,7.45549,3.696],
// 2 24 -1.531 7.45564 3.696 0 7.4 4
  [2,24,-1.531,7.45564,3.696,0,7.4,4],
// 2 24 -2.828 7.43754 2.828 -1.82387 7.63725 3.5
  [2,24,-2.828,7.43754,2.828,-1.82387,7.63725,3.5],
// 2 24 -1.82387 7.62949 3.5 -1.531 7.45564 3.696
  [2,24,-1.82387,7.62949,3.5,-1.531,7.45564,3.696],
// 2 24 -3.696 5.95328 1.531 -3.57091 6.29801 1.71792
  [2,24,-3.696,5.95328,1.531,-3.57091,6.29801,1.71792],
// 2 24 -3.57091 6.29801 1.71792 -3.21482 7.27982 2.25
  [2,24,-3.57091,6.29801,1.71792,-3.21482,7.27982,2.25],
// 2 24 -3.062 7.391 2.47835 -2.828 7.43754 2.828
  [2,24,-3.062,7.391,2.47835,-2.828,7.43754,2.828],
// 2 24 -3.21482 7.28888 2.25 -3.062 7.391 2.47835
  [2,24,-3.21482,7.28888,2.25,-3.062,7.391,2.47835],
// 2 24 -4 6.76422 0 -3.85108 6.86373 0.75
  [2,24,-4,6.76422,0,-3.85108,6.86373,0.75],
// 2 24 -3.75476 6.24083 1.23505 -3.85108 6.85442 0.75
  [2,24,-3.75476,6.24083,1.23505,-3.85108,6.85442,0.75],
// 2 24 -3.70215 5.90586 1.5 -3.75476 6.24083 1.23505
  [2,24,-3.70215,5.90586,1.5,-3.75476,6.24083,1.23505],
// 2 24 -3.70215 5.90586 1.5 -3.696 5.95328 1.531
  [2,24,-3.70215,5.90586,1.5,-3.696,5.95328,1.531],
// 2 24 -3.70187 6.25728 -1.50142 -3.696 6.30255 -1.531
  [2,24,-3.70187,6.25728,-1.50142,-3.696,6.30255,-1.531],
// 2 24 -3.7518 5.87268 -1.25 -3.70187 6.25728 -1.50142
  [2,24,-3.7518,5.87268,-1.25,-3.70187,6.25728,-1.50142],
// 2 24 -3.80706 6.22456 -0.971676 -3.90072 6.82123 -0.5
  [2,24,-3.80706,6.22456,-0.971676,-3.90072,6.82123,-0.5],
// 2 24 -3.7518 5.87268 -1.25 -3.80706 6.22456 -0.971676
  [2,24,-3.7518,5.87268,-1.25,-3.80706,6.22456,-0.971676],
// 2 24 -3.90072 6.83056 -0.5 -4 6.76422 0
  [2,24,-3.90072,6.83056,-0.5,-4,6.76422,0],
// 2 24 -2.828 7.43754 -2.828 -3.062 7.391 -2.47835
  [2,24,-2.828,7.43754,-2.828,-3.062,7.391,-2.47835],
// 2 24 -3.062 7.391 -2.47835 -3.38213 7.17709 -2
  [2,24,-3.062,7.391,-2.47835,-3.38213,7.17709,-2],
// 2 24 -3.696 6.30255 -1.531 -3.38213 7.16796 -2
  [2,24,-3.696,6.30255,-1.531,-3.38213,7.16796,-2],
// 2 24 -2.19743 7.55524 -3.25 -1.6993 7.25954 -3.58337
  [2,24,-2.19743,7.55524,-3.25,-1.6993,7.25954,-3.58337],
// 2 24 -1.6993 7.25954 -3.58337 -1.531 7.15958 -3.696
  [2,24,-1.6993,7.25954,-3.58337,-1.531,7.15958,-3.696],
// 2 24 -2.828 7.43754 -2.828 -2.19743 7.56295 -3.25
  [2,24,-2.828,7.43754,-2.828,-2.19743,7.56295,-3.25],
// 2 24 -1.531 7.15958 -3.696 0 7.104 -4
  [2,24,-1.531,7.15958,-3.696,0,7.104,-4],
// 2 24 0 7.104 -4 1.531 7.15931 -3.696
  [2,24,0,7.104,-4,1.531,7.15931,-3.696],
// 2 24 2.19743 7.56295 -3.25 2.828 7.43754 -2.828
  [2,24,2.19743,7.56295,-3.25,2.828,7.43754,-2.828],
// 2 24 1.55607 7.17419 -3.67922 2.19743 7.55524 -3.25
  [2,24,1.55607,7.17419,-3.67922,2.19743,7.55524,-3.25],
// 2 24 1.531 7.15931 -3.696 1.55607 7.17419 -3.67922
  [2,24,1.531,7.15931,-3.696,1.55607,7.17419,-3.67922],
// 2 24 3.696 6.30272 -1.531 3.38213 7.16796 -2
  [2,24,3.696,6.30272,-1.531,3.38213,7.16796,-2],
// 2 24 3.062 7.391 -2.47835 3.38213 7.17709 -2
  [2,24,3.062,7.391,-2.47835,3.38213,7.17709,-2],
// 2 24 2.828 7.43754 -2.828 3.062 7.391 -2.47835
  [2,24,2.828,7.43754,-2.828,3.062,7.391,-2.47835],
// 2 24 3.90072 6.83056 -0.5 4 6.76422 0
  [2,24,3.90072,6.83056,-0.5,4,6.76422,0],
// 2 24 3.7518 5.87268 -1.25 3.696 6.30272 -1.531
  [2,24,3.7518,5.87268,-1.25,3.696,6.30272,-1.531],
// 2 24 3.84139 6.44346 -0.798775 3.90072 6.82123 -0.5
  [2,24,3.84139,6.44346,-0.798775,3.90072,6.82123,-0.5],
// 2 24 3.7518 5.87268 -1.25 3.84139 6.44346 -0.798775
  [2,24,3.7518,5.87268,-1.25,3.84139,6.44346,-0.798775],
// 0
];
module ldraw_lib__4349(step=0, col=false, unit=2/5, alt=false, line=0.2, solid=!$preview)
    makepoly(ldraw_lib__4349(solid), step=step, col=col, unit=unit, alt=alt, line=line, solid=solid);
ldraw_lib__4349(line=0.2);
